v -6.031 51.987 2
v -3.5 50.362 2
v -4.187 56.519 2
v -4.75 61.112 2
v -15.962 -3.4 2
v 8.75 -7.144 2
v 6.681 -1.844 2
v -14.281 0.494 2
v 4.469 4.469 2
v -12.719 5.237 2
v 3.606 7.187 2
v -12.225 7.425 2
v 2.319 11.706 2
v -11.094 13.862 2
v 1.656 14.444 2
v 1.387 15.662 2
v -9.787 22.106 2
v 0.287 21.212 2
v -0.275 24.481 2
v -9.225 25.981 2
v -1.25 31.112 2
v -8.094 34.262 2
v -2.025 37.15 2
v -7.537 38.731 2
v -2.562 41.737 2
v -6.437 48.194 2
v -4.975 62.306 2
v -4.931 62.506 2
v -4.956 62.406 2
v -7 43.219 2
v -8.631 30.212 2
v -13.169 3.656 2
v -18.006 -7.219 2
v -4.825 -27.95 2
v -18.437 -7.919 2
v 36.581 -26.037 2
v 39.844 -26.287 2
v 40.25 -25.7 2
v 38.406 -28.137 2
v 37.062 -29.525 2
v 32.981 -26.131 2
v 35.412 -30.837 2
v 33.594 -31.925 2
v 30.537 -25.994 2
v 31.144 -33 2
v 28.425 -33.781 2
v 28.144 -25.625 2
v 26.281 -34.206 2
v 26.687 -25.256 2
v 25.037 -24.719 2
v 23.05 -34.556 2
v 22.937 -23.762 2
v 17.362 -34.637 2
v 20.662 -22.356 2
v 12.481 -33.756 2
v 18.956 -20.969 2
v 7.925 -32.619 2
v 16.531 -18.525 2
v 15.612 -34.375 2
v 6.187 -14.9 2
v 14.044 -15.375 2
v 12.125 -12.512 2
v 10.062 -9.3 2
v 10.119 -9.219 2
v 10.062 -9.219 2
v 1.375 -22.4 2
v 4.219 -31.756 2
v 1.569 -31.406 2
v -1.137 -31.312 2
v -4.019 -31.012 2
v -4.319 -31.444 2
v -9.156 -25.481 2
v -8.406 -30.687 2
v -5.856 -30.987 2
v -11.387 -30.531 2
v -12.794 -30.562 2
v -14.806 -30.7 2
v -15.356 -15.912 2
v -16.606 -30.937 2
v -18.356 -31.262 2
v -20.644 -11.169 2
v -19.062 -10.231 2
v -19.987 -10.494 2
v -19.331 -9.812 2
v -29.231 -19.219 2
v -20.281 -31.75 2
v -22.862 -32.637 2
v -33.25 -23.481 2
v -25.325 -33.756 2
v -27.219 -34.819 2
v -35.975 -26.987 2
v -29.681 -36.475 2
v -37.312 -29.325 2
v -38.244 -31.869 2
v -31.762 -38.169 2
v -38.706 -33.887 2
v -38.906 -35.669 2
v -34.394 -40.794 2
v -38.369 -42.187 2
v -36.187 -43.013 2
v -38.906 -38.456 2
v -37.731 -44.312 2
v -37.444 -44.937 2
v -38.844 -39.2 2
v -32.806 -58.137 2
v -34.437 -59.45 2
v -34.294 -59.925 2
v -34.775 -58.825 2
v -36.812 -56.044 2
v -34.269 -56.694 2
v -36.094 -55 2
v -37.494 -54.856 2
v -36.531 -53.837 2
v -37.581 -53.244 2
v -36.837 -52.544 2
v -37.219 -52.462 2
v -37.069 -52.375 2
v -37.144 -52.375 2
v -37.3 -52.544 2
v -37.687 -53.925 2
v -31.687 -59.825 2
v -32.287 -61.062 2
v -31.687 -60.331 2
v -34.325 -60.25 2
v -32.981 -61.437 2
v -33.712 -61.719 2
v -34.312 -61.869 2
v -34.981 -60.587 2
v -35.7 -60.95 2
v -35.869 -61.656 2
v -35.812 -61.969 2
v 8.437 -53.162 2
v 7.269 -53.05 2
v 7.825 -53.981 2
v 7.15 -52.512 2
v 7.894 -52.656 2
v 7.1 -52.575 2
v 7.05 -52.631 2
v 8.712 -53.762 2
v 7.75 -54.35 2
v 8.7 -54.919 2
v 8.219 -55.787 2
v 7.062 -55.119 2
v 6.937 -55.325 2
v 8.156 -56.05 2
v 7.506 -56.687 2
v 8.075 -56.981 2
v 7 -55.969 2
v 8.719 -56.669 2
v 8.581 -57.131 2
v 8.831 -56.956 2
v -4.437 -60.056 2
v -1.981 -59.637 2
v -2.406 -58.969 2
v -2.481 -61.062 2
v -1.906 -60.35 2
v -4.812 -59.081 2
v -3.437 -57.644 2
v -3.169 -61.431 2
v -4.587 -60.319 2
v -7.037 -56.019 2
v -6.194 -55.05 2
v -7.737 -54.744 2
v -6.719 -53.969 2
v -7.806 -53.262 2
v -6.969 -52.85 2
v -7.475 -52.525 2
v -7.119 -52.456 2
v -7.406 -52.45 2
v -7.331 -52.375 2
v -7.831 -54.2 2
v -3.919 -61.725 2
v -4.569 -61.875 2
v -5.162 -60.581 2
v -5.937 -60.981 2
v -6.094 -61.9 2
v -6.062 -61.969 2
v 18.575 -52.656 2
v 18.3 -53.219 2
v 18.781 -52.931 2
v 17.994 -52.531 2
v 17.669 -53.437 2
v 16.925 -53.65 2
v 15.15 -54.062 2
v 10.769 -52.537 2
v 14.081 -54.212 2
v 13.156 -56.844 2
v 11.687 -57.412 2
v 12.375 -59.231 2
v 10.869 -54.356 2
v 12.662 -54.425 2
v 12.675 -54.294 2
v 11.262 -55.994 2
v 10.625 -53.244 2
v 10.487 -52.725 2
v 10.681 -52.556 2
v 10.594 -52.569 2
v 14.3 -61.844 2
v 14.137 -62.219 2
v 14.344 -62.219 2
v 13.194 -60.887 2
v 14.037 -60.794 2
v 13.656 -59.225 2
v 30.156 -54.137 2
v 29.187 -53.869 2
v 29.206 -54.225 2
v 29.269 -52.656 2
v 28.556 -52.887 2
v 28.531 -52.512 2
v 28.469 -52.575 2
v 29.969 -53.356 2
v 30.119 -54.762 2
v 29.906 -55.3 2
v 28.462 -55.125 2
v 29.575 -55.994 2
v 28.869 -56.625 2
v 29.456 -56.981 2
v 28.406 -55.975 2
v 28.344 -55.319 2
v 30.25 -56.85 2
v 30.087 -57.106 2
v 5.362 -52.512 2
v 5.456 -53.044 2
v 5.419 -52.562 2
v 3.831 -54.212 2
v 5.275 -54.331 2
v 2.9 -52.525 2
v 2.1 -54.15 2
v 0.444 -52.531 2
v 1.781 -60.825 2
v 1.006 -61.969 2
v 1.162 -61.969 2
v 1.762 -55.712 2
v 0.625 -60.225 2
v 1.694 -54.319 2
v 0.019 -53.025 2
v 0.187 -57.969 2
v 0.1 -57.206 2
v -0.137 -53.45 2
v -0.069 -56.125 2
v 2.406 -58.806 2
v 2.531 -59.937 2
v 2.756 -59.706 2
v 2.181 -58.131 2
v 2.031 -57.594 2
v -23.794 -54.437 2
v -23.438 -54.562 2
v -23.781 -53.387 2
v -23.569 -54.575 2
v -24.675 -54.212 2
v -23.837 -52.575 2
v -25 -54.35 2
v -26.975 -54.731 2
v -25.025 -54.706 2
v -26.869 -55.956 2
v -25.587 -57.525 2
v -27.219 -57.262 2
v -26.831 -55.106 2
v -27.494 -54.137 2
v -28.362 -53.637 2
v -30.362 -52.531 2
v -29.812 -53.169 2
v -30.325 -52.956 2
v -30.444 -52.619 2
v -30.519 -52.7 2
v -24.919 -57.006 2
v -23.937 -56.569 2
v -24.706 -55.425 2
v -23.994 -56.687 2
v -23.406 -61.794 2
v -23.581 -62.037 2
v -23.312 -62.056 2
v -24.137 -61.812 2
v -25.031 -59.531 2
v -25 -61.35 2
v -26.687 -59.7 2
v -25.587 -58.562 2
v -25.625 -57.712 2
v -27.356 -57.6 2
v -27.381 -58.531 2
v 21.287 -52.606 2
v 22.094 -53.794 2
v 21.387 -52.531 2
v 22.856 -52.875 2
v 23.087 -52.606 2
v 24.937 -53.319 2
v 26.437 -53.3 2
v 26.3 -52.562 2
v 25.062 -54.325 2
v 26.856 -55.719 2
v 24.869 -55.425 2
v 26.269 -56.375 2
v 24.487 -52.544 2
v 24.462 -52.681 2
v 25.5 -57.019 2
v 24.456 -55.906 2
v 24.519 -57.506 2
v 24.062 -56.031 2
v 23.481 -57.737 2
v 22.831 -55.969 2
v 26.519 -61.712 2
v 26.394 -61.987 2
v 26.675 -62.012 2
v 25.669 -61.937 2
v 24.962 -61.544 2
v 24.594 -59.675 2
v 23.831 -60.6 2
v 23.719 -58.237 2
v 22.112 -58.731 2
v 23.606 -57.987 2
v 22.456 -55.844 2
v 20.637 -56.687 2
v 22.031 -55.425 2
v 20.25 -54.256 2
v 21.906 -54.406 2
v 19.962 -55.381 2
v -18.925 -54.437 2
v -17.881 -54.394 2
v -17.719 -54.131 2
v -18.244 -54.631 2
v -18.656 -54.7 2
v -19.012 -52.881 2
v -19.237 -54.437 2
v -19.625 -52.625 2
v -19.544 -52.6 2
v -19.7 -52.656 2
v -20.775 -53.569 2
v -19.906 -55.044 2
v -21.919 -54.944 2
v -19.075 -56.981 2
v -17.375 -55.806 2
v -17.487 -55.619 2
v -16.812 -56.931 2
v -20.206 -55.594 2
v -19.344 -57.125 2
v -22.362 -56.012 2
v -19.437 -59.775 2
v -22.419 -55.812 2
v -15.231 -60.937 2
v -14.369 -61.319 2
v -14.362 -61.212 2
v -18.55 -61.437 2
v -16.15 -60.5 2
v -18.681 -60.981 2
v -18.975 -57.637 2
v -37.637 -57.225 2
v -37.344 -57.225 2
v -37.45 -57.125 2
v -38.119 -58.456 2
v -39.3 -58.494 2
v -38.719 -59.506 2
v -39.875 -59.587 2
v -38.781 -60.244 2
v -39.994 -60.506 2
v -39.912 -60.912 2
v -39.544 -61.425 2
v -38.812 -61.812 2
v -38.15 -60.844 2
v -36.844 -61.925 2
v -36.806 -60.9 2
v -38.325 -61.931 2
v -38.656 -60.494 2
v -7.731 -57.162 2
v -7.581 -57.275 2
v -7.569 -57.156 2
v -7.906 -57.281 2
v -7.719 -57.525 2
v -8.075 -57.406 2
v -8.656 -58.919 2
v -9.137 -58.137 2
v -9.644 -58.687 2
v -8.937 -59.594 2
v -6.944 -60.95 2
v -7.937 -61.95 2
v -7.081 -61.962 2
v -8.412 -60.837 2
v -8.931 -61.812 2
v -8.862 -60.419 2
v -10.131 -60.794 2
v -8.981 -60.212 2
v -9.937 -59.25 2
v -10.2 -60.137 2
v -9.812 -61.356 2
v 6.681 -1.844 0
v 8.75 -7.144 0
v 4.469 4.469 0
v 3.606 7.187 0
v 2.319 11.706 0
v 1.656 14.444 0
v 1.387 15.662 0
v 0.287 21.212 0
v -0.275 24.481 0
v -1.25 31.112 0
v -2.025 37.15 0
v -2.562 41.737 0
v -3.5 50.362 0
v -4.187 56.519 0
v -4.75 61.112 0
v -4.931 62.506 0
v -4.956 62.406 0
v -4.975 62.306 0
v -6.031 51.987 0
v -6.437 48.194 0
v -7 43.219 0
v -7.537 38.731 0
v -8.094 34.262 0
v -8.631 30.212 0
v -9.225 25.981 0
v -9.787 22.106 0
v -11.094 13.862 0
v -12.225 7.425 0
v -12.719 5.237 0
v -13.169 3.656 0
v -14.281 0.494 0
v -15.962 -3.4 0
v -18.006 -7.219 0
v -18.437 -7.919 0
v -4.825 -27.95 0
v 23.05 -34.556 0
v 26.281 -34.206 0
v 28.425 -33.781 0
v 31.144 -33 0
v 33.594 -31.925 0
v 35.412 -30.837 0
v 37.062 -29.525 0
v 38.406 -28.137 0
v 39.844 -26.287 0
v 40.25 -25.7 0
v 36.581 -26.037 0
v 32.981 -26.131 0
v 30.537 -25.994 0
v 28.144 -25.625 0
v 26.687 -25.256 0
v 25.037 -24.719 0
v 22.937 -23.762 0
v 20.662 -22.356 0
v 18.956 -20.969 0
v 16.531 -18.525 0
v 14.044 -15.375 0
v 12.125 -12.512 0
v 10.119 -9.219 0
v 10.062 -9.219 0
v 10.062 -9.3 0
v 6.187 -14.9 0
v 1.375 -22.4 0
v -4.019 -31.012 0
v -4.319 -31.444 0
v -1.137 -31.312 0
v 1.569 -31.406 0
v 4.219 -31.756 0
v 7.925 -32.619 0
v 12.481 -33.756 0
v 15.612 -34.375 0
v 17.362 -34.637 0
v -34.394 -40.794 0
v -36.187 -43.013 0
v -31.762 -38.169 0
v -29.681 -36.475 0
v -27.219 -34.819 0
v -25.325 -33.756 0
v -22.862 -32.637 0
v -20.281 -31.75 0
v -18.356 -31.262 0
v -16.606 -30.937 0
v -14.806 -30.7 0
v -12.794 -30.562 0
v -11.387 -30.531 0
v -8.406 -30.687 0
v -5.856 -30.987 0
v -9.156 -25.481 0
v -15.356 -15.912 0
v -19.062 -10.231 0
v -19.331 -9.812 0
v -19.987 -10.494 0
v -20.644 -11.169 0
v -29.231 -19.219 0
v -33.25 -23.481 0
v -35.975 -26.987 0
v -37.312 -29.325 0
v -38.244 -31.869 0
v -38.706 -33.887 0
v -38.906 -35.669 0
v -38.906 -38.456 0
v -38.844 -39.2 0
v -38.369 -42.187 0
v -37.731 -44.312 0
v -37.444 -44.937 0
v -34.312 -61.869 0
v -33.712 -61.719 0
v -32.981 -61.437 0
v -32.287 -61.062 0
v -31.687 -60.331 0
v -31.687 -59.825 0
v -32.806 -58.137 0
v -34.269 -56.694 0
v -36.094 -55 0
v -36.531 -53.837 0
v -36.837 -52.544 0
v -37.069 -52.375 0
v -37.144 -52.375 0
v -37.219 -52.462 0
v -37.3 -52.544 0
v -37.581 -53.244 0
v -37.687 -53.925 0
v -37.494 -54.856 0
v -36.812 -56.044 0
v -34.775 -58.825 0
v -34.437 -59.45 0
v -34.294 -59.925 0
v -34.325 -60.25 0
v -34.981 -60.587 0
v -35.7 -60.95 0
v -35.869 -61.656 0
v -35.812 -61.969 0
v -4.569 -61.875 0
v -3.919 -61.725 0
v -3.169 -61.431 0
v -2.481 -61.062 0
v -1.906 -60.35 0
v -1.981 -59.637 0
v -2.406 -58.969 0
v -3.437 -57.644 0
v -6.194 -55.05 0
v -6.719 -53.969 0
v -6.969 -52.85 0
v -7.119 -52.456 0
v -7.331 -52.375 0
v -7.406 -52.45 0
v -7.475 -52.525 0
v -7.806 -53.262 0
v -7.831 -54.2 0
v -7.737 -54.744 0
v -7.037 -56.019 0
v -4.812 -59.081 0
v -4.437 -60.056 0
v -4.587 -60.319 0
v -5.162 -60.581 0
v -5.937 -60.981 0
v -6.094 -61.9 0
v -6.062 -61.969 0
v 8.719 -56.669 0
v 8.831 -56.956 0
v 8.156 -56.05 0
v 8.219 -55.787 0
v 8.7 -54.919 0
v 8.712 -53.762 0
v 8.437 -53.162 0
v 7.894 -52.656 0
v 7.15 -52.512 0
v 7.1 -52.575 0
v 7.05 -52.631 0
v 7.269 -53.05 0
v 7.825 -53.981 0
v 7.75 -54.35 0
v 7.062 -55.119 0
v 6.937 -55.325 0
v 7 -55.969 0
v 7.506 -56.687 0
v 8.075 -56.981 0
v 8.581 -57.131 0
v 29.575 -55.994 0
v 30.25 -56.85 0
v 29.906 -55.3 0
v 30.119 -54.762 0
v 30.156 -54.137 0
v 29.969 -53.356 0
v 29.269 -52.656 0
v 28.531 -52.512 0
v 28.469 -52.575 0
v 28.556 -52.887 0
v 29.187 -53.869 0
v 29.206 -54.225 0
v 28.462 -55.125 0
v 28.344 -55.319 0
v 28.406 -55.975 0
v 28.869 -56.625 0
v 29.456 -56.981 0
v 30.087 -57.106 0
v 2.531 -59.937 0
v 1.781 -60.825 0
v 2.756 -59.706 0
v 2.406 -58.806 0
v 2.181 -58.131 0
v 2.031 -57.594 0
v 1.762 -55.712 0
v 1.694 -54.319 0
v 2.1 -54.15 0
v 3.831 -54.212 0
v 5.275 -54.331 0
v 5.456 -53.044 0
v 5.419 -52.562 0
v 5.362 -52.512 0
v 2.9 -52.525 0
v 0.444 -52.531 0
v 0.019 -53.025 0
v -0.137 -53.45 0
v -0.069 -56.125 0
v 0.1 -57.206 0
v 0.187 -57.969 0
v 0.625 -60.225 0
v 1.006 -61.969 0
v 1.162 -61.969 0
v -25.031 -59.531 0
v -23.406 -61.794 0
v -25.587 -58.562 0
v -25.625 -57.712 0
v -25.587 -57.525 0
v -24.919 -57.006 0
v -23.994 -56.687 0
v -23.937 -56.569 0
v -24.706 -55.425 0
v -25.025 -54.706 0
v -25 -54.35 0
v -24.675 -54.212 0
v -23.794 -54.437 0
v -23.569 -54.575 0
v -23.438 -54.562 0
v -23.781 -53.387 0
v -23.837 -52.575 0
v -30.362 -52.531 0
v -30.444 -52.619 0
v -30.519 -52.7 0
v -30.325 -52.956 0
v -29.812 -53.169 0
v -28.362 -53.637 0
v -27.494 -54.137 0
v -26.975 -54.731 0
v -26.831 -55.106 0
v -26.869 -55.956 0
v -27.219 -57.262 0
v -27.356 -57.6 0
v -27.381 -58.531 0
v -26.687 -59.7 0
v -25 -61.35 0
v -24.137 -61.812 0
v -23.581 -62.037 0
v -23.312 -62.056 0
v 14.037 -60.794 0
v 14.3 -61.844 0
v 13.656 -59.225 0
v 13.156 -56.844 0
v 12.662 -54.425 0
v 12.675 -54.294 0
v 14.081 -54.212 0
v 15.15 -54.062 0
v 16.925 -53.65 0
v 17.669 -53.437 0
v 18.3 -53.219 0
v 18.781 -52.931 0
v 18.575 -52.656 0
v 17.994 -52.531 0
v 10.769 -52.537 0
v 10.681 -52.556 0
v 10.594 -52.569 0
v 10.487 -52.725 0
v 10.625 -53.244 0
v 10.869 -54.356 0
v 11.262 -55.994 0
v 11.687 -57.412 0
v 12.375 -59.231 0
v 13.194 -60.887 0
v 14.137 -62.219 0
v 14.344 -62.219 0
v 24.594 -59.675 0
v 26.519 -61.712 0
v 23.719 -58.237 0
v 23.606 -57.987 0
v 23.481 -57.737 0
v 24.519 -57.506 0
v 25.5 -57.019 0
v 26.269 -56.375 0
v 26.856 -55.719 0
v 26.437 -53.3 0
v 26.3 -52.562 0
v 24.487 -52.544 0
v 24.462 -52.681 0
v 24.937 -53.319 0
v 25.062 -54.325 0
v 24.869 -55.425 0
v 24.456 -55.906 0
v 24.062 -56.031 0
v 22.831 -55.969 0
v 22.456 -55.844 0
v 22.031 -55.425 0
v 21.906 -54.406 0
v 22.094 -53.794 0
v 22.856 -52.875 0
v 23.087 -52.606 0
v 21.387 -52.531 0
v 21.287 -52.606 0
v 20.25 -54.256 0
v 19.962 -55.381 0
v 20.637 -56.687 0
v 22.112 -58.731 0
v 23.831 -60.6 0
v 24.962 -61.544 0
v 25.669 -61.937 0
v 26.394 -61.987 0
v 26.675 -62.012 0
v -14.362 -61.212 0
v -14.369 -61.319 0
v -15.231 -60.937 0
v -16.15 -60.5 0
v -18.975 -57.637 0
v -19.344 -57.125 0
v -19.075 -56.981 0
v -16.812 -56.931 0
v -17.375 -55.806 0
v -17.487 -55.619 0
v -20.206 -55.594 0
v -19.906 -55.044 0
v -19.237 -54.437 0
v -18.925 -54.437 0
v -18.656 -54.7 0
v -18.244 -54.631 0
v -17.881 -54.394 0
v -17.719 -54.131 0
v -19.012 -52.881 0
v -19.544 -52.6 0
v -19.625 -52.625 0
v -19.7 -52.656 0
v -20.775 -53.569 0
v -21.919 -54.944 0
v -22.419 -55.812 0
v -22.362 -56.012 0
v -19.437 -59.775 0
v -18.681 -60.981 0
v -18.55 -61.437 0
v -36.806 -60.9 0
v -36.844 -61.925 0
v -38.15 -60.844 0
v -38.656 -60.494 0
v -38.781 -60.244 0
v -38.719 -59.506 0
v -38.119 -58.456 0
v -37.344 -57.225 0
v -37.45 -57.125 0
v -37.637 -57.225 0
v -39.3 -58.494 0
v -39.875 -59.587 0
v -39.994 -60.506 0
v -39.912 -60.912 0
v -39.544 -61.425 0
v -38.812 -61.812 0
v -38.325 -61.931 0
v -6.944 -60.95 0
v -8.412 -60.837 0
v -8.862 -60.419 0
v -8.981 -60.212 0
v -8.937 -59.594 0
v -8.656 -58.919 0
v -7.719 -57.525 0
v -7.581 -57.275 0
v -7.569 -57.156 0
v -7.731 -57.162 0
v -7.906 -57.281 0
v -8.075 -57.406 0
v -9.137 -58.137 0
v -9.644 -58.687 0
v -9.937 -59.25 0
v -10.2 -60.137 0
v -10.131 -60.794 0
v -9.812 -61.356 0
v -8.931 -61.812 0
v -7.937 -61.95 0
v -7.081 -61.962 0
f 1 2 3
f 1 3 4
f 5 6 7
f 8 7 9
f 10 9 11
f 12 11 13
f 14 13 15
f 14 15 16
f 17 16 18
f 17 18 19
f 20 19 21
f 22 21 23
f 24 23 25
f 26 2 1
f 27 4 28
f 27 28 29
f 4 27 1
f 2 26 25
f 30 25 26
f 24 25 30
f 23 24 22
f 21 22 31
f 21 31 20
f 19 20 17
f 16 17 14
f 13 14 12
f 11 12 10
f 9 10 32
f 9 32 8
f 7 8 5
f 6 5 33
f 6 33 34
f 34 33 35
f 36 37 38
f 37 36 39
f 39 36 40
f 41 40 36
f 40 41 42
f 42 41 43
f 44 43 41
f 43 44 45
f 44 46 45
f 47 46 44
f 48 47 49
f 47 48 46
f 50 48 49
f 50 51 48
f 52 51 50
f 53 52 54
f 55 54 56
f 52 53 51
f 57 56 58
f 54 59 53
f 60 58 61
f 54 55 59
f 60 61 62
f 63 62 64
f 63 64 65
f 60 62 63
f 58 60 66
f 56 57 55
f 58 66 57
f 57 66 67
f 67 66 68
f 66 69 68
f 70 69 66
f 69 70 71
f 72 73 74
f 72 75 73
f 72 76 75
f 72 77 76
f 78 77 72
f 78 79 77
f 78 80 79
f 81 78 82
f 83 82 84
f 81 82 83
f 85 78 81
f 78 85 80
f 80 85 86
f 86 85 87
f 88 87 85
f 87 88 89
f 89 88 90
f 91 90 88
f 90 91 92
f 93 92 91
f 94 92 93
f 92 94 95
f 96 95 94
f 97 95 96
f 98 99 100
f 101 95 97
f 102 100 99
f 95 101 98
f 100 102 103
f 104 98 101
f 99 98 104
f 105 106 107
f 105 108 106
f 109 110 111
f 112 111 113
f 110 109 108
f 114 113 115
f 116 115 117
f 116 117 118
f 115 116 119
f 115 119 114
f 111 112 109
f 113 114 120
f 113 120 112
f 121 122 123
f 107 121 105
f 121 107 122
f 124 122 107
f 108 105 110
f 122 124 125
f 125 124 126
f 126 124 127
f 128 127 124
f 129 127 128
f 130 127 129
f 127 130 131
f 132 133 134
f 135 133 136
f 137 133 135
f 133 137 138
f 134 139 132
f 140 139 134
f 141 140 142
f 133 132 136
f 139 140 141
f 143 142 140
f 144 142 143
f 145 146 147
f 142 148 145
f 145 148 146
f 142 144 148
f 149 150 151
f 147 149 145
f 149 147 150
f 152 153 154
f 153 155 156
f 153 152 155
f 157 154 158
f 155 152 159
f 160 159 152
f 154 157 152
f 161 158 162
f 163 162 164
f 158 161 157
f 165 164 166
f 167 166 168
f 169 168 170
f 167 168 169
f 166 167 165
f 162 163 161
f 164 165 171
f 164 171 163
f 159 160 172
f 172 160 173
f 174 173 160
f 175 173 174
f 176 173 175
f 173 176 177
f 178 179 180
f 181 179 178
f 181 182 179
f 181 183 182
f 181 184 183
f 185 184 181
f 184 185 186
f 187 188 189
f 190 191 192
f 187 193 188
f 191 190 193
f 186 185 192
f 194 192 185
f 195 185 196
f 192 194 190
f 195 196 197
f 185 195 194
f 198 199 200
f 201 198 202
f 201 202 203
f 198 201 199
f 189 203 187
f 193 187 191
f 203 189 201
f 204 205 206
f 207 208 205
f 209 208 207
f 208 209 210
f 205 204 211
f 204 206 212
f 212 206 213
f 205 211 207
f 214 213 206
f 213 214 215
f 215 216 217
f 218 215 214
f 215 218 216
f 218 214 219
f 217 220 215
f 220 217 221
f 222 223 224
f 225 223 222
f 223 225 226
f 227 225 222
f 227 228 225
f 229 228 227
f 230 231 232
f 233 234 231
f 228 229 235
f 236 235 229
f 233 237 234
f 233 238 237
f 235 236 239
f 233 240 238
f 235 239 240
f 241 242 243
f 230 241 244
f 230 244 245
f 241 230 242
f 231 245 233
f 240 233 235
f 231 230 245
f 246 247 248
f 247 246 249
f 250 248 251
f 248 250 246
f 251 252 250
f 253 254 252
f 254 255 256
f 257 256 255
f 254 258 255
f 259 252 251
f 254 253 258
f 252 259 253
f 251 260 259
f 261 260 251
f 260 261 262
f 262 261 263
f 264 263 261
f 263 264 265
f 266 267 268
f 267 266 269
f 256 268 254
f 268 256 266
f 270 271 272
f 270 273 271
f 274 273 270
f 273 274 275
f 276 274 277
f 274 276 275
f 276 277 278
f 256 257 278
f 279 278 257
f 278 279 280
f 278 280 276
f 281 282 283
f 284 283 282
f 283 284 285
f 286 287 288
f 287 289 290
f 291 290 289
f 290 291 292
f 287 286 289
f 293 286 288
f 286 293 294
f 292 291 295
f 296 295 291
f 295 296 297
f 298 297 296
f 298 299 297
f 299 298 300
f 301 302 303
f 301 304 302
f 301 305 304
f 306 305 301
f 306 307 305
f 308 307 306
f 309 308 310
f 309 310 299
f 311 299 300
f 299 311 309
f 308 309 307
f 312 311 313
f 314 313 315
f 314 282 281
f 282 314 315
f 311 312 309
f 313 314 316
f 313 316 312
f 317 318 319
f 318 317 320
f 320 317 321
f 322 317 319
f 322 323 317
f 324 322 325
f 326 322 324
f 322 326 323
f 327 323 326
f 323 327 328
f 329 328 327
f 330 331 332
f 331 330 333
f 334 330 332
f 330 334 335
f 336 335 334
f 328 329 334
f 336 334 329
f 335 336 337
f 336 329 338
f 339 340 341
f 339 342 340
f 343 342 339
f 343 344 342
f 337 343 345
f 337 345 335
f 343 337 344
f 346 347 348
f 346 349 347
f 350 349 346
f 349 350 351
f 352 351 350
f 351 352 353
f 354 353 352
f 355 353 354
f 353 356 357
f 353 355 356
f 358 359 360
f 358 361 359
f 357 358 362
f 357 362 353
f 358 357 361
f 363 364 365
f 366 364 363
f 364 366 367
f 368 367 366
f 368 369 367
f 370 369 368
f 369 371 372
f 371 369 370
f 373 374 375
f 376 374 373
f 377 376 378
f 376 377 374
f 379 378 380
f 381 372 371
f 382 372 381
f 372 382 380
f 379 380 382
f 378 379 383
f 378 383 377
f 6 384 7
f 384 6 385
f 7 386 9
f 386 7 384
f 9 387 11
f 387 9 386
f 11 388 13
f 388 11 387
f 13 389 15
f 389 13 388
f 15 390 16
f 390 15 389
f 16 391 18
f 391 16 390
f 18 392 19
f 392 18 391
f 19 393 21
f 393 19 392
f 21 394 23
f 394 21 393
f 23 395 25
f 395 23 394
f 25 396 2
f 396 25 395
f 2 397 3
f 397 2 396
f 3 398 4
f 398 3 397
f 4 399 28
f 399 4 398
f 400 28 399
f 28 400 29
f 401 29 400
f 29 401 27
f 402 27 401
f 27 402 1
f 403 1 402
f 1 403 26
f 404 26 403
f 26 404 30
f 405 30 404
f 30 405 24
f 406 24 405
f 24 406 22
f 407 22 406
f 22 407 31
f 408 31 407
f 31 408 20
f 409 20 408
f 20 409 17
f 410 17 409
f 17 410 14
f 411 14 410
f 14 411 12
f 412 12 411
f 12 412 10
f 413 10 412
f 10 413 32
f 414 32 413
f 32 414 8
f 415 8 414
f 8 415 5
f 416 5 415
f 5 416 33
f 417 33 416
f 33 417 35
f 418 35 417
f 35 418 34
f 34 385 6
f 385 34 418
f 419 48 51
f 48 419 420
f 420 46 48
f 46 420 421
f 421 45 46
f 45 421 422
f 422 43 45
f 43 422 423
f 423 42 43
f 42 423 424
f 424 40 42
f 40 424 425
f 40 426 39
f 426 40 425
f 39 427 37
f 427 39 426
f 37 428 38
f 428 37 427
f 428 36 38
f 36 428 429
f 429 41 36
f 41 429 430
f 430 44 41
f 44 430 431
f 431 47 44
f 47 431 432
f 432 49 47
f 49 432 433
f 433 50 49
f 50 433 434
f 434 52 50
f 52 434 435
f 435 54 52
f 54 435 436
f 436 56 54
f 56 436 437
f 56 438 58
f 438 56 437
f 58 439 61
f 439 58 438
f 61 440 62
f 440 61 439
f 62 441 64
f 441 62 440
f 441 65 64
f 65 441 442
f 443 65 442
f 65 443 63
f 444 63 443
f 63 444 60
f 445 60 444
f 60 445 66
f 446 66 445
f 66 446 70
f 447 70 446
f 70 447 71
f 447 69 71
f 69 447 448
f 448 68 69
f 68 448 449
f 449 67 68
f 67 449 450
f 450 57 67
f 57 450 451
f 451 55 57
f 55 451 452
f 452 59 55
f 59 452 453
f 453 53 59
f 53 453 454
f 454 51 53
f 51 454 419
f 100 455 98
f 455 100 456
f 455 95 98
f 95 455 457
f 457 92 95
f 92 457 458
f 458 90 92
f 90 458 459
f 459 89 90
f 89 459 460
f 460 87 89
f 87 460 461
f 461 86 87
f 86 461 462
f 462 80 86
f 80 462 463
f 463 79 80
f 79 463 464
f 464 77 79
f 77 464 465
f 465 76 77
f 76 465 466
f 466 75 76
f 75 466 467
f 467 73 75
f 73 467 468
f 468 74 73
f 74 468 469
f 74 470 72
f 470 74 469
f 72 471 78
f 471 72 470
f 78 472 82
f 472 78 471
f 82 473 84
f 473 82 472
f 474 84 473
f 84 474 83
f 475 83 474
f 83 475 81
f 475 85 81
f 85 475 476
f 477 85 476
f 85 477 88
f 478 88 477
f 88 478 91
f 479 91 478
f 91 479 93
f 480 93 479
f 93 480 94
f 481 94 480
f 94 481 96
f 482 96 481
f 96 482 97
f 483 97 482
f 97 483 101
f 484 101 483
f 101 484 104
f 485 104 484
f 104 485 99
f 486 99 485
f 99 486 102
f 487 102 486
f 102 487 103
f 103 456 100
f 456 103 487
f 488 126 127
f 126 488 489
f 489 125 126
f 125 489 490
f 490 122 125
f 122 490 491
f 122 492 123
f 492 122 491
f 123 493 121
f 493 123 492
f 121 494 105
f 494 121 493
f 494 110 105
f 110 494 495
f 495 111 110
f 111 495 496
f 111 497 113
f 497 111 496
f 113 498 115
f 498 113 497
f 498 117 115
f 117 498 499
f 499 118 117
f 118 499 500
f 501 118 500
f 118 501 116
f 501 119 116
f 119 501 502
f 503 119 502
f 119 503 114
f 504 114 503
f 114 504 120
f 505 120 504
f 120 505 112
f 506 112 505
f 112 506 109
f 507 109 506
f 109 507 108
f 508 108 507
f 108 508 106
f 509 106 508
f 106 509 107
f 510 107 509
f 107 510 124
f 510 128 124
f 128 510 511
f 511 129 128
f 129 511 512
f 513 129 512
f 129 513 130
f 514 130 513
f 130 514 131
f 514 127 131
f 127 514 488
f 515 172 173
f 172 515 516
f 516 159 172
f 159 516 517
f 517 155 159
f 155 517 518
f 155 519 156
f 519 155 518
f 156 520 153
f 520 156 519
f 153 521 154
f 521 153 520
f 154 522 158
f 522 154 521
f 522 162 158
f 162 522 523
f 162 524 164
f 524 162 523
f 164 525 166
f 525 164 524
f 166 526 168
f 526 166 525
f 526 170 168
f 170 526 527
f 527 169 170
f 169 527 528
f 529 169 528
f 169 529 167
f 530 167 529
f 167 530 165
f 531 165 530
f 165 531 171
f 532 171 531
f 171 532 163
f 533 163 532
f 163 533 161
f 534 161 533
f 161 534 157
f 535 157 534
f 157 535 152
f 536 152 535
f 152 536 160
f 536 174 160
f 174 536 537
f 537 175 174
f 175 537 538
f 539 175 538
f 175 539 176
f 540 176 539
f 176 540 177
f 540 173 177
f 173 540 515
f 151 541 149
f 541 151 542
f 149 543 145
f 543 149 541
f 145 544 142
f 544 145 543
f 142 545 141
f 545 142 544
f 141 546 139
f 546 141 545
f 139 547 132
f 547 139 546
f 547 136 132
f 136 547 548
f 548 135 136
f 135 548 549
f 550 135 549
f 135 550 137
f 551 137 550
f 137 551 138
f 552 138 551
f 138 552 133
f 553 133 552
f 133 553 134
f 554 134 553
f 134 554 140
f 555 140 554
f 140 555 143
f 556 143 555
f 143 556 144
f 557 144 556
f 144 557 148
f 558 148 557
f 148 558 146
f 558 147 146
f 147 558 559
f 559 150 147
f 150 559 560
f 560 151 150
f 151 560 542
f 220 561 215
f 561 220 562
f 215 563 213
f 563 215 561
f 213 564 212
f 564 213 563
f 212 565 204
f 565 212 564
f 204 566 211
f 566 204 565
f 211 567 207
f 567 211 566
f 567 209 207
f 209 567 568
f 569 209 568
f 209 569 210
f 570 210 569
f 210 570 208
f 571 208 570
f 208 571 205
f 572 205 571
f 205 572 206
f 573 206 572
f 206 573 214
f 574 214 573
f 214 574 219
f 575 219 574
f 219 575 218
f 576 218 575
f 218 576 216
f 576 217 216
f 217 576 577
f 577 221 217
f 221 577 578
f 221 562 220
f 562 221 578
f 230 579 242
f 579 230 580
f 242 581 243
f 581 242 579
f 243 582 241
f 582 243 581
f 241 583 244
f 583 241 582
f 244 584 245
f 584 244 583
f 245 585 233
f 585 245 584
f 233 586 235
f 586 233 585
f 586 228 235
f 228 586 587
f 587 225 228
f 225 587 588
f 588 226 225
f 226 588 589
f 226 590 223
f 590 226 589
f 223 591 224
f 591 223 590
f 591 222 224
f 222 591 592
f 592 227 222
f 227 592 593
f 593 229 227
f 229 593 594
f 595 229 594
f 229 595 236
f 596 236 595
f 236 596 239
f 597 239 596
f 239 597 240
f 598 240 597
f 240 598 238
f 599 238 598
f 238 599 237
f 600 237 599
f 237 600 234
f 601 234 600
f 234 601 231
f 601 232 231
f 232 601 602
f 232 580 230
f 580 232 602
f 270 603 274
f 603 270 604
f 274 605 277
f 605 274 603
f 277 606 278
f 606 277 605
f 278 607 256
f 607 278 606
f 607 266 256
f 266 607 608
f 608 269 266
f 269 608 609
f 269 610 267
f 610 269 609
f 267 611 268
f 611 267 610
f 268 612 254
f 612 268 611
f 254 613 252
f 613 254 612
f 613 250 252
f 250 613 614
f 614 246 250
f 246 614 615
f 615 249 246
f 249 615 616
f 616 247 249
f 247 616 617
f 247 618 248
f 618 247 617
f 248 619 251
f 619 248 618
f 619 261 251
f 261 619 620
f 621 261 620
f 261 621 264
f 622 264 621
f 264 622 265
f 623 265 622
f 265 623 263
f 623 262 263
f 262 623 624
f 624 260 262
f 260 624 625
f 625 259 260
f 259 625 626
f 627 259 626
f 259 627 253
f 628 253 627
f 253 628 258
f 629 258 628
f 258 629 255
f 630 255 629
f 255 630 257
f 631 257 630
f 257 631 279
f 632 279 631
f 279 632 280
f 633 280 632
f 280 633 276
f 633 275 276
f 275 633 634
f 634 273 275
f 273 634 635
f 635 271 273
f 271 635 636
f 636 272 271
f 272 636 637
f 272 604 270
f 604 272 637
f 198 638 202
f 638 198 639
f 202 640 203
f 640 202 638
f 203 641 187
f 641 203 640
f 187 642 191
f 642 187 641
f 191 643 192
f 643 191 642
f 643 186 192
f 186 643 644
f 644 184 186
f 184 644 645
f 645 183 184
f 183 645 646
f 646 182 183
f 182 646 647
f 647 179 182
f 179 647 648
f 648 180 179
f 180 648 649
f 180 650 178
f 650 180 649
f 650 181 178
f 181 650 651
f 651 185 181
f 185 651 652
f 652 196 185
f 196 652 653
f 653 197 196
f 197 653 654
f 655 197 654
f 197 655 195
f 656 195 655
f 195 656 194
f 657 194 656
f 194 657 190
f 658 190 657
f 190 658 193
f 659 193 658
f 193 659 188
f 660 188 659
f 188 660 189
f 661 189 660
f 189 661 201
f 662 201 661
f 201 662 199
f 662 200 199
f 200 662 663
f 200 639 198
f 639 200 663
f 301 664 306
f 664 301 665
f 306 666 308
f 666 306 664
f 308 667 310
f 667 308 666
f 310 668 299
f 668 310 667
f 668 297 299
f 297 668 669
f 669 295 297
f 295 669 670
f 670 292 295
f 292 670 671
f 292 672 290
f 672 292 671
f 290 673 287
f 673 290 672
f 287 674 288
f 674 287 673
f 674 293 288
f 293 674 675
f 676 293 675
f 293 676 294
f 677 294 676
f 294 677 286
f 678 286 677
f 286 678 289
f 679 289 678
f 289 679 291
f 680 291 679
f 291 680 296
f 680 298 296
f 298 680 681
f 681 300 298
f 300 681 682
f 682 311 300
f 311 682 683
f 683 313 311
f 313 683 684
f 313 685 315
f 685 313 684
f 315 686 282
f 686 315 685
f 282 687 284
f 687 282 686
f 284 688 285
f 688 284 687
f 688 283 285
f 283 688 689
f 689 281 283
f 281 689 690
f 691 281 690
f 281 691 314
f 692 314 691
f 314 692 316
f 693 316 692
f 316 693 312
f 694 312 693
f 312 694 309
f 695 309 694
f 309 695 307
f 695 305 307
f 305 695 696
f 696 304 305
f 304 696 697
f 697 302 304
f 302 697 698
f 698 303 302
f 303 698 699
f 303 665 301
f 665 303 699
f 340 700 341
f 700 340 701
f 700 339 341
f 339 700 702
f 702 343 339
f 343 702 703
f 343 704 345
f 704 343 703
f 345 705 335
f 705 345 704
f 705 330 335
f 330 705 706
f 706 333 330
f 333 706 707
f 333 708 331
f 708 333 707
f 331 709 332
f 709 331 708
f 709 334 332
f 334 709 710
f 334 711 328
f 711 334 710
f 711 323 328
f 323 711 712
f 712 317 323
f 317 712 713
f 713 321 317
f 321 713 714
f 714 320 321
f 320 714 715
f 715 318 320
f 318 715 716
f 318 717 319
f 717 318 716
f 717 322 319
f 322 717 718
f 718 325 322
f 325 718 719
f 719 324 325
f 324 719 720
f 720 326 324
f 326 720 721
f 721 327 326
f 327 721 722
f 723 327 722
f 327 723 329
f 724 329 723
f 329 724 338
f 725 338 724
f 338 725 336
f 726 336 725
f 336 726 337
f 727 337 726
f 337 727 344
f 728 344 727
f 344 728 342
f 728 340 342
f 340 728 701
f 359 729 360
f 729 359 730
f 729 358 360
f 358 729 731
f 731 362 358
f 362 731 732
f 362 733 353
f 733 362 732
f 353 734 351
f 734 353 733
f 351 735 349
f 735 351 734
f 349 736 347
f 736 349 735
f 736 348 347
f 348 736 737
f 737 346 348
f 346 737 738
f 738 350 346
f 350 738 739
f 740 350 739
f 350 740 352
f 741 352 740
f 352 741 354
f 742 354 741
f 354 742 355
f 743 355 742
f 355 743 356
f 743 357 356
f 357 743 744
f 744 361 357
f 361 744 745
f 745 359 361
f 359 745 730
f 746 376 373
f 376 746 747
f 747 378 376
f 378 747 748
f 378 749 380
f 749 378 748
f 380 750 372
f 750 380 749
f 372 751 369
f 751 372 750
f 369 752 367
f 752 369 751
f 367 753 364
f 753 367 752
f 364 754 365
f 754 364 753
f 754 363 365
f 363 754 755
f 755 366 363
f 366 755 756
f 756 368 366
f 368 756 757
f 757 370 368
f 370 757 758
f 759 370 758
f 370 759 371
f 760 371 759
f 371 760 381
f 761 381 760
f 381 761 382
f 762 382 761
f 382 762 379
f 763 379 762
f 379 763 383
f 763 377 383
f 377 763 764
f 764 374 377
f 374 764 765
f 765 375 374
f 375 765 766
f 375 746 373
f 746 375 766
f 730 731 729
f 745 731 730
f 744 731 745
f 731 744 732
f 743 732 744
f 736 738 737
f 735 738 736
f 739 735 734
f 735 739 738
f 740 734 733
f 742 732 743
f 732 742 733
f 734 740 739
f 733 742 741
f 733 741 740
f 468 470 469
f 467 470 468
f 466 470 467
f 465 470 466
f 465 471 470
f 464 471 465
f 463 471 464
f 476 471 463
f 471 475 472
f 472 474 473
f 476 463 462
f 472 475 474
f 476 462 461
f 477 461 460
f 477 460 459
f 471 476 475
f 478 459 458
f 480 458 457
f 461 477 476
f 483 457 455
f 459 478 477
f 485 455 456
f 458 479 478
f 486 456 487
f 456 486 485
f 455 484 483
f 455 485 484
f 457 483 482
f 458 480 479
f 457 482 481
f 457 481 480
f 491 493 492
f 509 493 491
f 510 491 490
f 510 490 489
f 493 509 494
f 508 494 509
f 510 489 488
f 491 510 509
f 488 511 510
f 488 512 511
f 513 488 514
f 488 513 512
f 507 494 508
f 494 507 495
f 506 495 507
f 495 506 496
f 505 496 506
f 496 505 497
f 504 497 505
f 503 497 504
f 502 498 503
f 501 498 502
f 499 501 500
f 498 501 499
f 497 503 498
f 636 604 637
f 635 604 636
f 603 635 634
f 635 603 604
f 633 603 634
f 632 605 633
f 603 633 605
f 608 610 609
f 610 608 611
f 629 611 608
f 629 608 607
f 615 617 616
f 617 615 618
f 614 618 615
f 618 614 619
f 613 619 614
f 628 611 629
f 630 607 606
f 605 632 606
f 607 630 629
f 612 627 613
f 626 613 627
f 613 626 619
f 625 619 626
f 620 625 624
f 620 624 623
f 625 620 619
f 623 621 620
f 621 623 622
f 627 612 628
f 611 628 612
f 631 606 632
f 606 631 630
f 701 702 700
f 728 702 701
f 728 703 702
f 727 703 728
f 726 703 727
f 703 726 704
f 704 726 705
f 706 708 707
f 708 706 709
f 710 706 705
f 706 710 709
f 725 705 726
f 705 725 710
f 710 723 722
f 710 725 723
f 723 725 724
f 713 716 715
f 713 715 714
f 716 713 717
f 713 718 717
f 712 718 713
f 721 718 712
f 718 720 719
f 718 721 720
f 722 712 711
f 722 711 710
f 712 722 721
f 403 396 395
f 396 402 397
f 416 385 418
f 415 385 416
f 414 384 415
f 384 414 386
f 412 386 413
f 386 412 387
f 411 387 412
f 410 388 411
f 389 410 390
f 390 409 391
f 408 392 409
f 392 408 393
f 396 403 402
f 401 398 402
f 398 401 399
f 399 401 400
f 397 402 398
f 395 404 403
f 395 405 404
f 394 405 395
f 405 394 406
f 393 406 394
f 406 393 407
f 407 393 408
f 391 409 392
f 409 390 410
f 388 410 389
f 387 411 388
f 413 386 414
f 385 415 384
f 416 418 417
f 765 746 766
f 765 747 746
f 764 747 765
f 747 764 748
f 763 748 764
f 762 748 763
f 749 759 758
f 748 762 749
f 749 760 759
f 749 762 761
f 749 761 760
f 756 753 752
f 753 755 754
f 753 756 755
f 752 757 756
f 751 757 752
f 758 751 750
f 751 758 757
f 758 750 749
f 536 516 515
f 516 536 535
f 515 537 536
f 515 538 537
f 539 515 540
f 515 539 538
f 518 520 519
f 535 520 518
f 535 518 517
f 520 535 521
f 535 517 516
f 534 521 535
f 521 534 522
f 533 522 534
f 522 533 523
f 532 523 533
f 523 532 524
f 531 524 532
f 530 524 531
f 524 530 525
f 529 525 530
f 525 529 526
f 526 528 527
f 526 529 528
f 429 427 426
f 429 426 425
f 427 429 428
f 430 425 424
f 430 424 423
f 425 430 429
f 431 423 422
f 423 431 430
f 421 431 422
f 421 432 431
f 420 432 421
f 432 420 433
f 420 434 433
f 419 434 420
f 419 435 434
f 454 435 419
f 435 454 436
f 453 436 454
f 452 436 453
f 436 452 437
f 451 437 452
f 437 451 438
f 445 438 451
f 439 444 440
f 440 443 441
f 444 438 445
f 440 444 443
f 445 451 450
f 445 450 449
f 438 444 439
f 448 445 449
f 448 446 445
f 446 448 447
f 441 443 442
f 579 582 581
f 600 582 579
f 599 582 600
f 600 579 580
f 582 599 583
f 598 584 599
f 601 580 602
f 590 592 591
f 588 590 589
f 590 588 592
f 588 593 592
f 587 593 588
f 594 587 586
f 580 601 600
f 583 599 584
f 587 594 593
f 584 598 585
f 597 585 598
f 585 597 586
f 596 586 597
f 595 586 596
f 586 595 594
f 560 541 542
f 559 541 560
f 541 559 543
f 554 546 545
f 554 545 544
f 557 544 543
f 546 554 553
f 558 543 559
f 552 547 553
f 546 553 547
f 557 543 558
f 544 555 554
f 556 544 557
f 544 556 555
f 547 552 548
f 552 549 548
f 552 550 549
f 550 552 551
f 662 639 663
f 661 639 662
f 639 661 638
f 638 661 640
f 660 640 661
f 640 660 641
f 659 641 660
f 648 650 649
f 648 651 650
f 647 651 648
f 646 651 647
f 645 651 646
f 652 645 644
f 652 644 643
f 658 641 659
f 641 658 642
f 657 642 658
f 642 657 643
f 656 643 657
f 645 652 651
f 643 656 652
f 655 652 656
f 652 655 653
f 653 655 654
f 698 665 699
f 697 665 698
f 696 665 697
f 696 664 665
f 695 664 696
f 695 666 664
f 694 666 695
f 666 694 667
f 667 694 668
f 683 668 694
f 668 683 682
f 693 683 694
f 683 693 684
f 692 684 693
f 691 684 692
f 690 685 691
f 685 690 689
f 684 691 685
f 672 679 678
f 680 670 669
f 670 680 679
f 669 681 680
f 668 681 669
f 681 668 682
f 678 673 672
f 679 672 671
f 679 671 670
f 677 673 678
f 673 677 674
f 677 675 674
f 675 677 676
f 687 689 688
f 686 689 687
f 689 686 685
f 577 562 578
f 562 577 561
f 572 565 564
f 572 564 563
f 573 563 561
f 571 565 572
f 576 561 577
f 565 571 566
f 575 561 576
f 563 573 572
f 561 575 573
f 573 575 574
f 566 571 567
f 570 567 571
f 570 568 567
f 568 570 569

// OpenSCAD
module 5f40488ea5aaccd06f18ee773c3739cb_1()
{
 /* Generated by trace2scad version 20150415
    http://aggregate.org/MAKE/TRACE2SCAD/
    Optimized model has 387/4796 original points
 */
 color([0.48, 0.48, 0.48])
 assign(minx=0) /* polygon minx=39 */
 assign(miny=0) /* polygon miny=45 */
 assign(maxx=12880) /* polygon maxx=12880 */
 assign(maxy=20000) /* polygon maxy=20001 */
 assign(dx=maxx-minx)
 assign(dy=maxy-miny)
 assign(maxd=((dx>dy)?dx:dy))
 scale([1/maxd, 1/maxd, 1])
 translate([-minx-dx/2, -miny-dy/2, 0])
 linear_extrude(height=1, convexity=387)
 union() {
  union() {
   polygon([[5647,19985],[5644,19969],[5475,18318],[5410,17711],[5320,16915],[5234,16197],[5145,15482],[5059,14834],[4964,14157],[4874,13537],[4665,12218],[4484,11188],[4405,10838],[4333,10585],[4155,10079],[3886,9456],[3559,8845],[3490,8733],[5668,5528],[7840,8857],[7509,9705],[7155,10715],[7017,11150],[6811,11873],[6705,12311],[6662,12506],[6486,13394],[6396,13917],[6240,14978],[6116,15944],[6030,16678],[5880,18058],[5770,19043],[5680,19778],[5651,20001]], convexity=6);
   polygon([[8050,8518],[8050,8512],[7430,7616],[6660,6416],[5797,5038],[5749,4969],[6258,4990],[6691,4975],[7115,4919],[7708,4781],[8437,4599],[8938,4500],[9218,4458],[10128,4471],[10645,4527],[10988,4595],[11423,4720],[11815,4892],[12106,5066],[12370,5276],[12585,5498],[12815,5794],[12880,5888],[12293,5834],[11717,5819],[11326,5841],[10943,5900],[10710,5959],[10446,6045],[10110,6198],[9746,6423],[9473,6645],[9085,7036],[8687,7540],[8380,7998],[8059,8525],[8050,8525]], convexity=9);
   polygon([[3242,8321],[3137,8213],[1763,6925],[1120,6243],[684,5682],[470,5308],[321,4901],[247,4578],[215,4293],[215,3847],[225,3728],[301,3250],[403,2910],[449,2810],[650,3118],[937,3473],[1358,3893],[1691,4164],[2085,4429],[2388,4599],[2782,4778],[3195,4920],[3503,4998],[3783,5050],[4071,5088],[4393,5110],[4618,5115],[5095,5090],[5503,5042],[4975,5923],[3983,7454],[3390,8363],[3347,8430]], convexity=7);
   polygon([[485,1606],[472,1593],[427,1481],[410,1372],[441,1223],[550,1033],[876,588],[930,488],[953,412],[948,360],[843,306],[728,248],[701,135],[710,85],[950,101],[1046,125],[1163,170],[1274,230],[1370,347],[1370,428],[1191,698],[957,929],[665,1200],[595,1386],[546,1593],[509,1620],[497,1620]], convexity=8);
   polygon([[5255,1608],[5244,1596],[5191,1478],[5187,1328],[5202,1241],[5314,1037],[5670,547],[5730,391],[5706,349],[5614,307],[5490,243],[5465,96],[5470,85],[5709,100],[5813,124],[5933,171],[6043,230],[6135,344],[6123,458],[6055,565],[5890,777],[5449,1192],[5365,1365],[5325,1544],[5301,1607],[5267,1620]], convexity=8);
   polygon([[6904,1596],[6511,1595],[6443,1516],[6418,1448],[6429,1020],[6456,847],[6470,725],[6540,364],[6601,85],[6626,85],[6725,268],[6845,410],[6881,447],[6825,591],[6789,699],[6765,785],[6722,1086],[6711,1309],[6776,1336],[7053,1326],[7284,1307],[7313,1513],[7307,1590],[7298,1598]], convexity=10);
   polygon([[7576,1588],[7568,1579],[7603,1512],[7692,1363],[7680,1304],[7570,1181],[7550,1148],[7560,1045],[7641,930],[7732,883],[7813,859],[7853,887],[7835,933],[7745,1032],[7755,1074],[7832,1213],[7834,1398],[7790,1494],[7703,1575],[7584,1598]], convexity=10);
   polygon([[11000,1593],[10995,1588],[11009,1538],[11110,1381],[11113,1324],[10994,1180],[10975,1149],[10985,1044],[11059,940],[11153,883],[11254,863],[11280,904],[11172,1041],[11225,1152],[11259,1238],[11265,1338],[11235,1463],[11123,1575],[11005,1598]], convexity=10);
   polygon([[1569,1581],[1557,1568],[1588,1527],[1670,1493],[1902,1418],[2041,1338],[2124,1243],[2147,1183],[2141,1047],[2085,838],[2063,784],[2059,635],[2170,448],[2440,184],[2578,110],[2667,74],[2710,71],[2695,113],[2435,475],[2346,630],[2340,766],[2346,796],[2453,879],[2601,930],[2610,949],[2487,1132],[2436,1247],[2440,1304],[2492,1326],[2633,1290],[2669,1268],[2690,1270],[2635,1458],[2626,1588],[1582,1595]], convexity=13);
   polygon([[8149,1591],[8135,1589],[8118,1564],[8140,1481],[8179,1303],[8242,1041],[8310,814],[8420,523],[8551,258],[8702,45],[8735,45],[8728,105],[8686,273],[8625,524],[8545,905],[8466,1292],[8468,1313],[8693,1326],[8864,1350],[9148,1416],[9267,1450],[9368,1485],[9445,1531],[9412,1575],[9319,1595],[8163,1594]], convexity=9);
   polygon([[9854,1589],[9846,1583],[9680,1319],[9634,1139],[9742,930],[9978,603],[10253,304],[10434,153],[10547,90],[10663,82],[10708,78],[10683,126],[10375,452],[10235,682],[10217,722],[10197,762],[10363,799],[10520,877],[10643,980],[10737,1085],[10670,1472],[10648,1590],[10358,1593],[10354,1571],[10430,1469],[10450,1308],[10419,1132],[10353,1055],[10290,1035],[10093,1045],[10033,1065],[9965,1132],[9945,1295],[9975,1393],[10097,1540],[10134,1583],[9862,1595]], convexity=13);
   polygon([[3300,1580],[3288,1575],[3116,1429],[2933,1209],[2853,1070],[2862,1038],[3330,436],[3451,243],[3472,170],[4141,189],[4142,206],[4003,250],[3856,320],[3404,778],[3345,860],[3388,883],[3750,891],[3660,1071],[3642,1101],[3207,1105],[3255,1193],[3362,1290],[3412,1290],[3455,1248],[3521,1259],[3579,1297],[3605,1339],[3398,1539],[3313,1584]], convexity=12);
   polygon([[433,852],[418,844],[152,641],[60,466],[41,319],[54,254],[113,172],[230,110],[308,91],[545,92],[551,256],[336,265],[255,321],[235,361],[245,479],[341,647],[465,844],[448,860]], convexity=8);
   polygon([[5175,835],[5148,815],[4978,698],[4897,610],[4850,520],[4808,378],[4819,273],[4870,183],[5011,110],[5170,88],[5307,86],[5329,248],[5094,266],[5022,333],[5003,366],[5010,465],[5055,573],[5205,796],[5227,836],[5229,855],[5203,854]], convexity=8);
  }
 }
}

module 5f40488ea5aaccd06f18ee773c3739cb()
{
 /* all layers combined, scaled to within a 1mm cube */
 scale([1, 1, 1/1])
 difference() {
  union() {
   scale([1,1,2]) translate([0,0,-0.5]) 5f40488ea5aaccd06f18ee773c3739cb_1();
  }
  translate([0,0,-2]) cube([2,2,4],center=true);
 }
}

scale([125, 125, 2]) {
	5f40488ea5aaccd06f18ee773c3739cb();
}
